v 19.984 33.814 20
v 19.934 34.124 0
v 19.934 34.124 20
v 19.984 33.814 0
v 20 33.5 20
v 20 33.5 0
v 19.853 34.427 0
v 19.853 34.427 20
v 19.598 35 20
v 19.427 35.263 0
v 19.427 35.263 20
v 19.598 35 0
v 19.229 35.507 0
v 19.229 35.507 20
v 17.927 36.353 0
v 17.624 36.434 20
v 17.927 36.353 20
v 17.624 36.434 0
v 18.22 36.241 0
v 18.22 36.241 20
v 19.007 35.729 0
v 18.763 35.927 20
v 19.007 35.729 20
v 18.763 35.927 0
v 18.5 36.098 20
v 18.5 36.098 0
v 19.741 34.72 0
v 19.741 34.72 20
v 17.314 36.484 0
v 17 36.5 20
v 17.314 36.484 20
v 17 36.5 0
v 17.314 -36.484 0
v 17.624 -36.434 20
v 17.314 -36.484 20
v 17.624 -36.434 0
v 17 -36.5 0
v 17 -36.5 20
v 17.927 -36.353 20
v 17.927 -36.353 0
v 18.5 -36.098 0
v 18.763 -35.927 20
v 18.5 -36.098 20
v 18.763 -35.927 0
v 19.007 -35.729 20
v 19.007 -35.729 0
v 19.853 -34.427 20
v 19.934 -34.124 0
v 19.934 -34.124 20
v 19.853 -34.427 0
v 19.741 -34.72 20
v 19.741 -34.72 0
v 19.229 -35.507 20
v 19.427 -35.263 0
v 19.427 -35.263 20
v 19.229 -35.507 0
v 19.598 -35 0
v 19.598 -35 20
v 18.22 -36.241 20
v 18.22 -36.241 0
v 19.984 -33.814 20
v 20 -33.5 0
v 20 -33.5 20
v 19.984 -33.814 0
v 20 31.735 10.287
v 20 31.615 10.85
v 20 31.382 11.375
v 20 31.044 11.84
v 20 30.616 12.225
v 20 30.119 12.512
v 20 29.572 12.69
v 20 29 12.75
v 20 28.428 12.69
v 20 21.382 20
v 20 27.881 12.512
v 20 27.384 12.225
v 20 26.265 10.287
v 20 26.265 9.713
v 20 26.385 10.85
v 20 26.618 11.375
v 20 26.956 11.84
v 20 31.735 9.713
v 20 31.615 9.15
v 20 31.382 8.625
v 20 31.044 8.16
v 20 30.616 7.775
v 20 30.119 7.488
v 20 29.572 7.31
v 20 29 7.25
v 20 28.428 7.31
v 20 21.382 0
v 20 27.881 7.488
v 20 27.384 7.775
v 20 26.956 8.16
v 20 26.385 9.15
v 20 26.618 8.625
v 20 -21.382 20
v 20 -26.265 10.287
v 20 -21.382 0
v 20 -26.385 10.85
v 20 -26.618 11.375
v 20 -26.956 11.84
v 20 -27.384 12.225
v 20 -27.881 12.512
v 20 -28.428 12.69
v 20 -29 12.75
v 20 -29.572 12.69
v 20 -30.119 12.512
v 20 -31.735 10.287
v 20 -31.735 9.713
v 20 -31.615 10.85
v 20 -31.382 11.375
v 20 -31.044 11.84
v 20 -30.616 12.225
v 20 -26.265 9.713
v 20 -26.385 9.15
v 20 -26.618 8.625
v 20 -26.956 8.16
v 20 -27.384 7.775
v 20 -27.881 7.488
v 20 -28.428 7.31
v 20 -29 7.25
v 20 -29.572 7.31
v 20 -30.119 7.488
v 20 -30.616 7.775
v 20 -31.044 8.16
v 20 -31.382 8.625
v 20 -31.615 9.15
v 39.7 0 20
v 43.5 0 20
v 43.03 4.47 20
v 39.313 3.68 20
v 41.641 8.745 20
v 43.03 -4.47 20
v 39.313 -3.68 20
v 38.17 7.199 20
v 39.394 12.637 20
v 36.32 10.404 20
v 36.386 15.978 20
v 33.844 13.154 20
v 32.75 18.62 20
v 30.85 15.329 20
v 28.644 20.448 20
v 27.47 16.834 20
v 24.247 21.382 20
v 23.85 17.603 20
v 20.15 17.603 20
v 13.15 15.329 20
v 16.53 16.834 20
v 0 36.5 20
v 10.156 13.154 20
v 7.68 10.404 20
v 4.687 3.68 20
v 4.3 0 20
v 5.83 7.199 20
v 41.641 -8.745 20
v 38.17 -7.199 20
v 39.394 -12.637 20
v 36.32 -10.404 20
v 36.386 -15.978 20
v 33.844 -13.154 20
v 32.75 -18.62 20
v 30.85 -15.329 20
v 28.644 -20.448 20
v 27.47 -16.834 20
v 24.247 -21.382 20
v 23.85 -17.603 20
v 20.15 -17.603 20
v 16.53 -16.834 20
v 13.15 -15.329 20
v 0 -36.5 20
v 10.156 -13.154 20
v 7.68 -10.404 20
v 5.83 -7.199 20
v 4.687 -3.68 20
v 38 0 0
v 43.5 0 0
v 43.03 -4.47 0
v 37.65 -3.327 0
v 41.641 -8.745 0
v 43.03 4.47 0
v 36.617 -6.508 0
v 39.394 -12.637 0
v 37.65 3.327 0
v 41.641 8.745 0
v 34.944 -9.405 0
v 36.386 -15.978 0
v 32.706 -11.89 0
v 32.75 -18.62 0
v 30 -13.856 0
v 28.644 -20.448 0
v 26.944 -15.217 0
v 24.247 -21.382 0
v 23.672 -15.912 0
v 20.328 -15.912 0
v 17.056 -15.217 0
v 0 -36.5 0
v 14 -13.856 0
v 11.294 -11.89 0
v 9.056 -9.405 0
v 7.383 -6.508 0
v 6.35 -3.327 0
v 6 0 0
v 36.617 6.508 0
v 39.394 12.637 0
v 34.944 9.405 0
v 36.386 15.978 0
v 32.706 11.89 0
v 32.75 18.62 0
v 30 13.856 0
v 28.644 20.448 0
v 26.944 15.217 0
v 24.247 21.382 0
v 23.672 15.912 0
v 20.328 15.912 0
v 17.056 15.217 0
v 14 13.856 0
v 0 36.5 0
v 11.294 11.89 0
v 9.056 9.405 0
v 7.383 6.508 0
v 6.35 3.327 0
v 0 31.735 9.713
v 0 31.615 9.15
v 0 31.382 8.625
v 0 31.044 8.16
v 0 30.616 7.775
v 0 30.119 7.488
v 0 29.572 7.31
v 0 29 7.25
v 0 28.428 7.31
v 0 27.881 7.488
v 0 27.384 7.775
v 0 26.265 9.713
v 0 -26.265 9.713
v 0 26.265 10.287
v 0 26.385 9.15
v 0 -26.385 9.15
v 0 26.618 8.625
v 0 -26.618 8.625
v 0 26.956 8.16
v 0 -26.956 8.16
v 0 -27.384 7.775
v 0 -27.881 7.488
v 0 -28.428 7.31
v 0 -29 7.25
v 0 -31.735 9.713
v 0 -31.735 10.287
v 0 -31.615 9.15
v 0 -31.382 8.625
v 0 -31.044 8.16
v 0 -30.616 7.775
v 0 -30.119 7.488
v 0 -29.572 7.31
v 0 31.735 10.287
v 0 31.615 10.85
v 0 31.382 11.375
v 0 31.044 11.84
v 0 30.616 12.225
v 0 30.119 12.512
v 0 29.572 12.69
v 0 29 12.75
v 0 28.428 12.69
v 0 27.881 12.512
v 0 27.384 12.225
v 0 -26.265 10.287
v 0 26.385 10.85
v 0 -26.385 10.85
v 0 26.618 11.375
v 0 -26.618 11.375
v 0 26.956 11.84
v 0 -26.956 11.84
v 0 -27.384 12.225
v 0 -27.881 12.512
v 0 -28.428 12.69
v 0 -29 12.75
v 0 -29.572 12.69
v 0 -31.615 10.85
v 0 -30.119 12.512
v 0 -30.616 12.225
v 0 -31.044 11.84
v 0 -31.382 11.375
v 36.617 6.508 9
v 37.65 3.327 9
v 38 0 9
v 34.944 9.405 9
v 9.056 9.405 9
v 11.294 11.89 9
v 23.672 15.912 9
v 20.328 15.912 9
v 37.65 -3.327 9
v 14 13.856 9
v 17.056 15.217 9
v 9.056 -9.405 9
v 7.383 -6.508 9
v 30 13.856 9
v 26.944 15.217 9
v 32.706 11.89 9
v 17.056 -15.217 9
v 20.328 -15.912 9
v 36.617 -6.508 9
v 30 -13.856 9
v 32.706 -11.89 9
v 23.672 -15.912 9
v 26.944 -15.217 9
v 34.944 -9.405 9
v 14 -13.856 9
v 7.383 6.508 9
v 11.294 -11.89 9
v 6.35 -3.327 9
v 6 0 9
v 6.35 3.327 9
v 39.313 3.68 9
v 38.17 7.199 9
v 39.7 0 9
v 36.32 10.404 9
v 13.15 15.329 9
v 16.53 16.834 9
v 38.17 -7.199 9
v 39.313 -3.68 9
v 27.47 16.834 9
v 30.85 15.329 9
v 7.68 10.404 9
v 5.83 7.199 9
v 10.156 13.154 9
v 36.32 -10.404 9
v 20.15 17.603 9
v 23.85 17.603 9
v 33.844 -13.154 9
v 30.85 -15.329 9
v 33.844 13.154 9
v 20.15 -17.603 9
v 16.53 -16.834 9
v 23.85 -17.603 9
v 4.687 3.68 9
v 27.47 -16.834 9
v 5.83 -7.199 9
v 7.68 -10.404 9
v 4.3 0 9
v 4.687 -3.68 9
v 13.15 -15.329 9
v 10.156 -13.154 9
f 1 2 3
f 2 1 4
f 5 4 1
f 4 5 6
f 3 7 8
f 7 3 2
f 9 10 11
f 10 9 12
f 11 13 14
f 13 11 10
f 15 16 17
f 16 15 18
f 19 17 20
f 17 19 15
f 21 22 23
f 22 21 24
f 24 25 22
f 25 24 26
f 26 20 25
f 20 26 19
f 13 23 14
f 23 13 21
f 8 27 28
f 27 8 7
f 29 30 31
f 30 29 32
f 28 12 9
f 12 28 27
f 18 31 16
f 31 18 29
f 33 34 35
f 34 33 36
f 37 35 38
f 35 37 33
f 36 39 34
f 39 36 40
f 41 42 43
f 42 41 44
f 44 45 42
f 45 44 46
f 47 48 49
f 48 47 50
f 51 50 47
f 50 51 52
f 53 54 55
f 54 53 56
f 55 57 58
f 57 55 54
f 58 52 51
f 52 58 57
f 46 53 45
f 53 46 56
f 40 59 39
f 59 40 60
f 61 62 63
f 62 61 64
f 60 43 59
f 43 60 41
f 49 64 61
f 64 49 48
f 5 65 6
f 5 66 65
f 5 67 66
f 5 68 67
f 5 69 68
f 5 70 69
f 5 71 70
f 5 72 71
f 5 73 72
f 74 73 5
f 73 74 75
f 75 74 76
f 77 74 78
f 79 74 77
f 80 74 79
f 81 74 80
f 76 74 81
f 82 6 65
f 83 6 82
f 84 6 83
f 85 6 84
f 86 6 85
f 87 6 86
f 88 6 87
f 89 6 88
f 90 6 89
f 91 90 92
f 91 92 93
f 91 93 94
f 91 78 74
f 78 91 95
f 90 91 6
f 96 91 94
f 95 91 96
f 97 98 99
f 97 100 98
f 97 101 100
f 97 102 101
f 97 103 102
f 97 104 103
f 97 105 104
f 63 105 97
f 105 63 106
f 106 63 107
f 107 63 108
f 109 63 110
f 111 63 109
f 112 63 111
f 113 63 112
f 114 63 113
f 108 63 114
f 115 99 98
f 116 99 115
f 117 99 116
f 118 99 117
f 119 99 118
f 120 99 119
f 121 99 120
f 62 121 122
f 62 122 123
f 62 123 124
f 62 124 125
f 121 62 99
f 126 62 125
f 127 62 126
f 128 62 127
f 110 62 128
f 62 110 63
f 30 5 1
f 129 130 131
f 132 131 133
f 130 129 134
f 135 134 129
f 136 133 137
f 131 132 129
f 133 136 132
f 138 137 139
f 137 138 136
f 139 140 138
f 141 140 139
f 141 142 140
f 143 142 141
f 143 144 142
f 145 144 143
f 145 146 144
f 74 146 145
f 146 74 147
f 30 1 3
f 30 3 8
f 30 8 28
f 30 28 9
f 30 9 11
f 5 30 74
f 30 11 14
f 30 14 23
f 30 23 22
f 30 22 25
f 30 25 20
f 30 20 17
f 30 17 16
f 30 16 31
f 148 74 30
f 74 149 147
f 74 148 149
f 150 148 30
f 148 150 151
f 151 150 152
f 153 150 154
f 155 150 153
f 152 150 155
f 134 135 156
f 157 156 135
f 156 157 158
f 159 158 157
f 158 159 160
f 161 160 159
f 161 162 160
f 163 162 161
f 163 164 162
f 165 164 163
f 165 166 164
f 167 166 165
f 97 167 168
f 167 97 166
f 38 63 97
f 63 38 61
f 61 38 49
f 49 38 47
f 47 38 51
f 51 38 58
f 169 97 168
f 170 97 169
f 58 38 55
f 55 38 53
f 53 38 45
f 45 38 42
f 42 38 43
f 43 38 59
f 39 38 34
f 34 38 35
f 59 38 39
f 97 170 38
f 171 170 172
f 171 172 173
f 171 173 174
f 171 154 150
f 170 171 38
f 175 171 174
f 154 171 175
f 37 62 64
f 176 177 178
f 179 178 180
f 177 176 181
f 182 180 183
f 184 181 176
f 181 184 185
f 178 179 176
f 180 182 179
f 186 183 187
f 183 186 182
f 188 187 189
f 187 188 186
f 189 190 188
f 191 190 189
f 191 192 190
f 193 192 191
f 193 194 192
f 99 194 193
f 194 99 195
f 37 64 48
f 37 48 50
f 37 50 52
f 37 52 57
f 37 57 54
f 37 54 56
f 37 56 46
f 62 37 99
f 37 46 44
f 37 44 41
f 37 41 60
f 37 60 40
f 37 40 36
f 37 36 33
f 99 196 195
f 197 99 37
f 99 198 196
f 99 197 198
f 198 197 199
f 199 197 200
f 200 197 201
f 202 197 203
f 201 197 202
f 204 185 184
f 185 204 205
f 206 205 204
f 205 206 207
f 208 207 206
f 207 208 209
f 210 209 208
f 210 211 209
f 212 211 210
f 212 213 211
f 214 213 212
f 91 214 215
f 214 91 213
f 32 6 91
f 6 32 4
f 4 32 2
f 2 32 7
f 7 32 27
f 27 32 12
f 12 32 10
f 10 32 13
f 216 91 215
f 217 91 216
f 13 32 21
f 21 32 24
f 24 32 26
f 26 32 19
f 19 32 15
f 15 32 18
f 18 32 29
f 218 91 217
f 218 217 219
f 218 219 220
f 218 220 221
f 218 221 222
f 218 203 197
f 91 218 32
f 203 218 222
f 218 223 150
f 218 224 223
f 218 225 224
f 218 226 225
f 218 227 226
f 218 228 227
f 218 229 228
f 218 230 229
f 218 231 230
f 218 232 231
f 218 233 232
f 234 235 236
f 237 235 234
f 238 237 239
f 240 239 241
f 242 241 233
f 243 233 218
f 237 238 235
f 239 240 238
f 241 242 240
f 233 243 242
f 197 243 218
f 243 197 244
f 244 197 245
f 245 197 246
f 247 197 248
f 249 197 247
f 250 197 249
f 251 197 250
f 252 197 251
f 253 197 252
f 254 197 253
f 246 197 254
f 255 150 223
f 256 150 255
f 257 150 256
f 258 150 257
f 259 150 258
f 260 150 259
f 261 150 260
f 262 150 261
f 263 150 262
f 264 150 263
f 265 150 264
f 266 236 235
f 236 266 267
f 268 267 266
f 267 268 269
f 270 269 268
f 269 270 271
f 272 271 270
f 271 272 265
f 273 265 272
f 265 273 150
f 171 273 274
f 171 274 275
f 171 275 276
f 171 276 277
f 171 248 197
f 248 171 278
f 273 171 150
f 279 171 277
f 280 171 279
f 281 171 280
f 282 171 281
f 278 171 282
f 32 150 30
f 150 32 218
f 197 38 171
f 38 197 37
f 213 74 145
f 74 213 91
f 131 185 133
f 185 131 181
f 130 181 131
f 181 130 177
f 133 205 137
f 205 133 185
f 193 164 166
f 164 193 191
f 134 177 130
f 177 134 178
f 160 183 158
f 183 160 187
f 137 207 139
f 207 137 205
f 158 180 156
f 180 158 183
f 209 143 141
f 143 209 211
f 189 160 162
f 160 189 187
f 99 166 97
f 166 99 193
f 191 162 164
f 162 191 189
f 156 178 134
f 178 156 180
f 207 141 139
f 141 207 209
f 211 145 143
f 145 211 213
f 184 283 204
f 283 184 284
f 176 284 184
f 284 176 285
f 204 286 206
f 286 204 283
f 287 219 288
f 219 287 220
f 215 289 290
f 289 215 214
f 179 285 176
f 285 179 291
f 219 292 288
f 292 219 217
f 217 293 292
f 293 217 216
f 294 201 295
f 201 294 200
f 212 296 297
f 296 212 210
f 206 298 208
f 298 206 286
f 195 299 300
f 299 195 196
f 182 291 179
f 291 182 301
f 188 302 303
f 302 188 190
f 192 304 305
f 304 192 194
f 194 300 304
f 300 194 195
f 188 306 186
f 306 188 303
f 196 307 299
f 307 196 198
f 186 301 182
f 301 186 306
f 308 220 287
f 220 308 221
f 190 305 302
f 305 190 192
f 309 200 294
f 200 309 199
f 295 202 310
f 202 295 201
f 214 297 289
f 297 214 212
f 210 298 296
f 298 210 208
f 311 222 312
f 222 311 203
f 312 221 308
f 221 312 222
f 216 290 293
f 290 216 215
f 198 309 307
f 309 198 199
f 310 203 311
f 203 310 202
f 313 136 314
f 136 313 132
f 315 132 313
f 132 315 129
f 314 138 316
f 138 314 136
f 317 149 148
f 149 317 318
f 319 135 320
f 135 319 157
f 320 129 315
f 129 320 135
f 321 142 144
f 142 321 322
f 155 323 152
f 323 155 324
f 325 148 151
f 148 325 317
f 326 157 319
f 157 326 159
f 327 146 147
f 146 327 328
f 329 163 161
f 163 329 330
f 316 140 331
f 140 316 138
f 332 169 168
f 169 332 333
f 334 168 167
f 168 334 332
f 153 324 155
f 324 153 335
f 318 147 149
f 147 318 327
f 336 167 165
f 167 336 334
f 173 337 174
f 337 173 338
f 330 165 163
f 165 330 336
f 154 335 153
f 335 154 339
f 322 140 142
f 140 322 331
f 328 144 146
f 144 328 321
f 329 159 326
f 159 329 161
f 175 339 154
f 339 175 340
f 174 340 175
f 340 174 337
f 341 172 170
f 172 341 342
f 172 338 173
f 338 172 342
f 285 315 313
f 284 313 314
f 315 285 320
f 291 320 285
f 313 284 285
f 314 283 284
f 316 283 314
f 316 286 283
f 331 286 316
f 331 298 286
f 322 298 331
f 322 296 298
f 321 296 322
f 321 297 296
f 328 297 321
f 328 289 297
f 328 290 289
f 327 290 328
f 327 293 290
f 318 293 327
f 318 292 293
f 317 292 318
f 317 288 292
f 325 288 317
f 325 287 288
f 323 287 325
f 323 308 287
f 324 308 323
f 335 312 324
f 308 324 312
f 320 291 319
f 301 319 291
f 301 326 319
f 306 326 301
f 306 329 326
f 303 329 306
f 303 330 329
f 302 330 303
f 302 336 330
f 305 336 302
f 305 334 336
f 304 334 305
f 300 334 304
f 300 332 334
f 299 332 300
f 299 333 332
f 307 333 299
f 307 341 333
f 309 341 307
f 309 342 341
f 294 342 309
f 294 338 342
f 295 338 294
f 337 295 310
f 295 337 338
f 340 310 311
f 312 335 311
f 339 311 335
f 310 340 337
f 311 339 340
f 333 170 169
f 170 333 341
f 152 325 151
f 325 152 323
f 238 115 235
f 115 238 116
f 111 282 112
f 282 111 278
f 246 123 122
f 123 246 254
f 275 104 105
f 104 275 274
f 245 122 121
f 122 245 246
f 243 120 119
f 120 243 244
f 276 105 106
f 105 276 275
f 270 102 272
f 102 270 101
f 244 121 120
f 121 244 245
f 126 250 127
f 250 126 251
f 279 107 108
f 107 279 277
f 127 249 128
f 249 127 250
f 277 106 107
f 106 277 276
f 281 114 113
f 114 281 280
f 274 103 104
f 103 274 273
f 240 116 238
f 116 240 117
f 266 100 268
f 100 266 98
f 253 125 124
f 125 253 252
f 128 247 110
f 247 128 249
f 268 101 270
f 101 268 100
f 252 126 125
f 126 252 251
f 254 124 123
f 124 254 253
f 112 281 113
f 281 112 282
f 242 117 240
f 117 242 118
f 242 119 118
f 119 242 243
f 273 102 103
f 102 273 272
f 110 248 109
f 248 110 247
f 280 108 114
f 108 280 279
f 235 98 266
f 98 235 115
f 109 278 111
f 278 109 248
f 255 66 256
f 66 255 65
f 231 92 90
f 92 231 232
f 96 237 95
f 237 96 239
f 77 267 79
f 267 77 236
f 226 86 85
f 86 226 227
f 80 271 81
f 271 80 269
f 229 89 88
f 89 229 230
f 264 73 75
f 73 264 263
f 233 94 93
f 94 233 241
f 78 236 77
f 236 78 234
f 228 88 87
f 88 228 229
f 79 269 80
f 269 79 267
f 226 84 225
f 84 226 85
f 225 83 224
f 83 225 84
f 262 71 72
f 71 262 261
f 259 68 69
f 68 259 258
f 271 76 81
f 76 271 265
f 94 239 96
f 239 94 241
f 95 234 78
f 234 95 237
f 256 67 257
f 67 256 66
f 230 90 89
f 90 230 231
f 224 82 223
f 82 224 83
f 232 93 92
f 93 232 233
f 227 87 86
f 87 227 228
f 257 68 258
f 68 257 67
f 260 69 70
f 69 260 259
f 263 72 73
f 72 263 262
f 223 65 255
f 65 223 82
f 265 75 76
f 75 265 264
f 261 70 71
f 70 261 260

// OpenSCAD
// file: ../library.scad
//rounded cube Functions from: http://www.thingiverse.com/thing:38069


module cube_fillet(size,radius=-1,vertical,top,bottom,center=false,$fn=0){
    if (center) {
        cube_fillet_inside(size, radius, vertical, top, bottom, $fn=$fn);
    } else {
        translate([size[0]/2, size[1]/2, size[2]/2])
            cube_fillet_inside(size, radius, vertical, top, bottom, $fn=$fn);
    }
}
module fillet(radius, height=100, $fn=60) {  
    //this creates negative of fillet,
    //i.e. thing to be substracted from object
    translate([-radius, -radius, -height/2-0.01])
        difference() {
            cube([radius*2, radius*2, height+0.02]);
            cylinder(r=radius, h=height+0.02, $fn=$fn);
        }
}

module cube_negative_fillet(size,radius=-1,vertical, top,bottom,$fn=0){
    j=[1,0,1,0];

    for (i=[0:3]) {
        if (radius > -1) {
            rotate([0, 0, 90*i])
                translate([size[1-j[i]]/2, size[j[i]]/2, 0])
                    fillet(radius, size[2], $fn=$fn);
        } else {
            rotate([0, 0, 90*i])
                translate([size[1-j[i]]/2, size[j[i]]/2, 0])
                    fillet(vertical[i], size[2], $fn=$fn);

        }
        rotate([90*i, -90, 0])
            translate([size[2]/2, size[j[i]]/2, 0 ])
                fillet(top[i], size[1-j[i]], $fn=$fn);
        rotate([90*(4-i), 90, 0])
            translate([size[2]/2, size[j[i]]/2, 0])
                fillet(bottom[i], size[1-j[i]], $fn=$fn);
    }
}

module cube_fillet_inside(size,radius=-1,vertical,top,bottom,$fn=0){

    if (radius == 0) {
        cube(size, center=true);
    } else {
        difference() {
            cube(size, center=true);
            cube_negative_fillet(size, radius, vertical, top, bottom, $fn=$fn);
        }
    }
}
// file: ../dimensions.scad
// Dimensions
// Author: sdavi


LM8UU = [8, 15, 24];//rod diameter,outter diameter, length
LM12UU = [12, 21, 30];
LM12LUU = [12, 21, 57];
LM12UUx2 = [LM12UU[0], LM12UU[1], LM12UU[2]*2];

BEARING_624 = [4,13,5]; //inner diameter(hole), outter diameter, thickness (http://reprap.org/wiki/Ball_bearing)
BEARING_2x624 = [4, 13, 10]; // 2 624 bearings together, good size for GT2

BEARING_6300 = [10,35,11]; //inner diameter, outer diameter, thickness

vslot_wheel = [23.89,10.23];	//23.89 & 10.23
vslot_wheel_hole = 5+0.5;
vslot_wheel_eccentric = 7.2+0.5; //hole for eccentric spacer
vslot_wheel_spacer_length = 6.35;


t_nut_length = 15+1; //hole in center 1mm cleanance incase hole isnt actually center




GT2_belt_width = 6;
GT2_belt_pitch = 2;
GT2_belt_thickness = 1.38;
GT2_belt_tooth_height = 0.75;  
GT2_belt_tooth_ratio = 0.5;



GT2_pulley_geared_diameter=12.2;//measured from top of tooth to top of tooth opp side// 12.2 is for the 20 tooth pulley

//from metric (prusa i3)
m4_diameter = 4.6;
m4_nut_diameter = 7.6;
m4_nut_diameter_horizontal = 8.15;

m3_diameter = 3.6;
m3_nut_diameter = 5.3;
m3_nut_diameter_horizontal = 6.8;
m3_washer_diameter = 6.9;
//end i3 variables

m5_diameter = 5.5;

//Hex Head M3x30: Head 5.5mm flat to flat, 2.12mm thick
m3_hex_head_diameter = 5.5*2/sqrt(3) + 0.2;

M4 = m4_diameter;
M3 = m3_diameter;
M5 = m5_diameter;
m4_washer_thickness = 0.8; //flat and penny washers
m4_washer_diameter = 9.6;

nema17_holes = 31;// mm between screws
nema17_width = 42; //width
nema17_height = 48;
// file: ../configuration.scad
// Configuration
// Author: sdavi


include <dimensions.scad>
use <library.scad>


x_rod_distance = 45;

y_bearing = LM8UU;
x_bearing = LM8UU;
//z_bearing = LM12UUx2;
z_bearing = LM12LUU;
belt_bearing = BEARING_2x624;


end_belt_bearing_distance = 25;// distance between 2 bearings on y-ends
belt_clearance = 9.5; //space for belts
x_belt_clearance = 5; //spacing between x-axis vslot and belt

frame_screw = M5; //m5 screws for v/tslot

// calculated vars


//y bearing block
y_bearing_block_length = 2*y_bearing[2] + M3*2 + 5;
//y_bearing_block_width = y_bearing[1]+5;
y_bearing_block_width = 20; //vslot frame width

y_bearing_block_height = 6+y_bearing[1]/2;

//xy_bearing_distance = y_bearing_block_width/2+belt_clearance+belt_bearing[1]/2; //distance between center of y-bearing to center of x-belt bearing 
xy_bearing_distance = vslot_wheel[1]/2+vslot_wheel_spacer_length+belt_clearance+belt_bearing[1]/2; //distance between center of v_slot to center of x-belt bearing 




//min height for belt bearings
min_beltbearing_height = max(((belt_bearing[2]+m4_washer_thickness*2) * 2), y_bearing_block_height);
// main file
// z_ends
// Author: sdavi



include <../configuration.scad>
include <../dimensions.scad>


nema_mount_thickness = 10;
nema_mount_height = 30;

nema_padding = 3;
side_thickness=15;

frame_width=20; //20x20

z_motor_mount_height=nema_padding+nema17_height+nema_mount_thickness;
z_motor_mount_width = side_thickness+nema_padding+nema17_width+nema_padding+side_thickness;
z_motor_mount_length = frame_width+1+nema17_width;


shaft_center =  1+nema17_width/2;
echo("ShaftCenter: ", shaft_center);


echo("height: ", z_motor_mount_height);
echo("width: ", z_motor_mount_width);
echo("length: ", z_motor_mount_length);


bearing_mount();
//z_motor_end(single_piece=1);



module z_motor_end(single_piece=0){

	if(single_piece==1){
		translate([0,0,z_motor_mount_height])rotate([180,0,0])
			z_motor_end_single();
	} else {



		rotate([0,-90,-90])intersection(){
			translate([0,0,z_motor_mount_height])rotate([180,0,0])
				z_motor_end_main();
			translate([-0.1, -z_motor_mount_length-0.1, -0.1])
				cube([30.1, z_motor_mount_length+0.2, z_motor_mount_height+0.2]);

		}

		translate([5,0,z_motor_mount_width])rotate([0,90,90])intersection(){
			translate([0,0,z_motor_mount_height])rotate([180,0,0])
				z_motor_end_main();
			translate([z_motor_mount_width-30, -z_motor_mount_length-0.1, -0.1])
				cube([30.1, z_motor_mount_length+0.2, z_motor_mount_height+0.2]);

		}




	}
	
	

}



module z_motor_end_single(){
	union(){
		z_motor_end_main(single_piece=1);
		
		//add thin part to print without supports (drill out)
		for(x= [side_thickness/2, z_motor_mount_width-side_thickness/2]){
			
			// vertical screw
			translate([x,z_motor_mount_length-frame_width/2, 0]){
				//countersink to suit screw length				
				translate([0,0,frame_width+36])
					cylinder(d=12+1, h=0.2, $fn=60);
			}
		} //

	}

}

module z_motor_end_main(single_piece=0){
	
	rounded_corners = (single_piece==1)?[3,3,3,3]:[0,0,0,0]; //use rounded corners on the single piece
	
	difference(){	
		union(){
			cube_fillet([z_motor_mount_width, z_motor_mount_length, z_motor_mount_height], vertical=rounded_corners);
			//cube_fillet([z_length, nema_mount_thickness, nema_mount_height], vertical=[0,0,3,3], top=[0,3,0,3]);
		}

		//nema cutout;
		translate([side_thickness, -0.1,-0.1]) cube([nema_padding+nema17_width+nema_padding+0.1, nema17_width+1+0.1, nema_padding+nema17_height+0.1]);



		//cutout for frame
		translate([-0.1, z_motor_mount_length-20-0.1, -0.1])cube([z_motor_mount_width+0.2,20+0.2,20]);


		//nema holes
		translate([side_thickness+nema_padding+nema17_width/2, nema17_width/2, z_motor_mount_height-nema_mount_thickness-0.1]){
			cylinder(d=28, h=nema_mount_thickness+0.2, $fn=60);//central hole
			
			translate([-nema17_holes/2, -nema17_holes/2, 0]) cylinder(d=M3, h=nema_mount_thickness+0.2, $fn=60);
			translate([-nema17_holes/2, nema17_holes/2, 0]) cylinder(d=M3, h=nema_mount_thickness+0.2, $fn=60);
			translate([nema17_holes/2, -nema17_holes/2, 0]) cylinder(d=M3, h=nema_mount_thickness+0.2, $fn=60);
			translate([nema17_holes/2, nema17_holes/2, 0]) cylinder(d=M3, h=nema_mount_thickness+0.2, $fn=60);

/*			rotate([-90,0,0]) 
				cylinder(d=M3, h=nema_mount_thickness+0.4, $fn=60);
			translate([nema17_holes, 0,0]) rotate([-90,0,0]) 
				cylinder(d=M3, h=nema_mount_thickness+0.2, $fn=60);
			translate([nema17_holes/2, 0, nema17_holes/2]) rotate([-90,0,0])
				cylinder(d=28, h=nema_mount_thickness+0.2, $fn=60);// central nema hole
*/
		}


		//curved end
		translate([-0.1,-10, 0]) rotate([0,90,0])cylinder(d=60, h=z_motor_mount_width+0.2, $fn=60);		



		//21 height for screw horiz for 25mm screw;
		//36 depth for vert for 40mm screw


		//frame holes
		for(x= [side_thickness/2, z_motor_mount_width-side_thickness/2]){
			//horizontal screw
			translate([x,-0.1,frame_width/2 ]){
				rotate([-90,0,0])
					cylinder(d=frame_screw, h=z_motor_mount_length, $fn=60);
				//countersink to suit screw length
				rotate([-90,0,0])
					cylinder(d=11.5, h=z_motor_mount_length-frame_width-21, $fn=60);
				
			}

			// vertical screw
			translate([x,z_motor_mount_length-frame_width/2, 0]){
				cylinder(d=frame_screw, h=z_motor_mount_height, $fn=60);
				//countersink to suit screw length				
				translate([0,0,frame_width+36])
					cylinder(d=12, h=z_motor_mount_height, $fn=60);
			}
		} //end for loop
	} // end difference


} // end module


module bearing_mount(){

	bearing_end_length=BEARING_6300[1]+8 + 15+15; 
	bearing_end_width=20;
	bearing_end_height=20;



	difference(){
		union(){
			translate([shaft_center, 0,0]) 
				cylinder(d=BEARING_6300[1]+8, h=bearing_end_height, $fn=30);
			translate([0,-bearing_end_length/2,0])
				cube_fillet([bearing_end_width, bearing_end_length, bearing_end_height], vertical=[3,0,0,3]);
			
		}
	
		//center hole for rod
		translate([shaft_center,0,-0.1]) 
			cylinder(d=BEARING_6300[1]-3, h=bearing_end_height+0.2, $fn=30);
		
		//hole for bearing 6300z
		translate([shaft_center,0,bearing_end_height-BEARING_6300[2]]) 
			cylinder(d=BEARING_6300[1]+0.4, h=BEARING_6300[2]+0.1, $fn=30);
	
		//frame_holes
		translate([-0.1,-bearing_end_length/2+15/2, bearing_end_height/2]) 
			rotate([0,90,0])cylinder(d=frame_screw, h=bearing_end_width+0.2, $fn=30);
		translate([-0.1, bearing_end_length/2-15/2, bearing_end_height/2])
			rotate([0,90,0])cylinder(d=frame_screw, h=bearing_end_width+0.2, $fn=30);
		
	}

}
